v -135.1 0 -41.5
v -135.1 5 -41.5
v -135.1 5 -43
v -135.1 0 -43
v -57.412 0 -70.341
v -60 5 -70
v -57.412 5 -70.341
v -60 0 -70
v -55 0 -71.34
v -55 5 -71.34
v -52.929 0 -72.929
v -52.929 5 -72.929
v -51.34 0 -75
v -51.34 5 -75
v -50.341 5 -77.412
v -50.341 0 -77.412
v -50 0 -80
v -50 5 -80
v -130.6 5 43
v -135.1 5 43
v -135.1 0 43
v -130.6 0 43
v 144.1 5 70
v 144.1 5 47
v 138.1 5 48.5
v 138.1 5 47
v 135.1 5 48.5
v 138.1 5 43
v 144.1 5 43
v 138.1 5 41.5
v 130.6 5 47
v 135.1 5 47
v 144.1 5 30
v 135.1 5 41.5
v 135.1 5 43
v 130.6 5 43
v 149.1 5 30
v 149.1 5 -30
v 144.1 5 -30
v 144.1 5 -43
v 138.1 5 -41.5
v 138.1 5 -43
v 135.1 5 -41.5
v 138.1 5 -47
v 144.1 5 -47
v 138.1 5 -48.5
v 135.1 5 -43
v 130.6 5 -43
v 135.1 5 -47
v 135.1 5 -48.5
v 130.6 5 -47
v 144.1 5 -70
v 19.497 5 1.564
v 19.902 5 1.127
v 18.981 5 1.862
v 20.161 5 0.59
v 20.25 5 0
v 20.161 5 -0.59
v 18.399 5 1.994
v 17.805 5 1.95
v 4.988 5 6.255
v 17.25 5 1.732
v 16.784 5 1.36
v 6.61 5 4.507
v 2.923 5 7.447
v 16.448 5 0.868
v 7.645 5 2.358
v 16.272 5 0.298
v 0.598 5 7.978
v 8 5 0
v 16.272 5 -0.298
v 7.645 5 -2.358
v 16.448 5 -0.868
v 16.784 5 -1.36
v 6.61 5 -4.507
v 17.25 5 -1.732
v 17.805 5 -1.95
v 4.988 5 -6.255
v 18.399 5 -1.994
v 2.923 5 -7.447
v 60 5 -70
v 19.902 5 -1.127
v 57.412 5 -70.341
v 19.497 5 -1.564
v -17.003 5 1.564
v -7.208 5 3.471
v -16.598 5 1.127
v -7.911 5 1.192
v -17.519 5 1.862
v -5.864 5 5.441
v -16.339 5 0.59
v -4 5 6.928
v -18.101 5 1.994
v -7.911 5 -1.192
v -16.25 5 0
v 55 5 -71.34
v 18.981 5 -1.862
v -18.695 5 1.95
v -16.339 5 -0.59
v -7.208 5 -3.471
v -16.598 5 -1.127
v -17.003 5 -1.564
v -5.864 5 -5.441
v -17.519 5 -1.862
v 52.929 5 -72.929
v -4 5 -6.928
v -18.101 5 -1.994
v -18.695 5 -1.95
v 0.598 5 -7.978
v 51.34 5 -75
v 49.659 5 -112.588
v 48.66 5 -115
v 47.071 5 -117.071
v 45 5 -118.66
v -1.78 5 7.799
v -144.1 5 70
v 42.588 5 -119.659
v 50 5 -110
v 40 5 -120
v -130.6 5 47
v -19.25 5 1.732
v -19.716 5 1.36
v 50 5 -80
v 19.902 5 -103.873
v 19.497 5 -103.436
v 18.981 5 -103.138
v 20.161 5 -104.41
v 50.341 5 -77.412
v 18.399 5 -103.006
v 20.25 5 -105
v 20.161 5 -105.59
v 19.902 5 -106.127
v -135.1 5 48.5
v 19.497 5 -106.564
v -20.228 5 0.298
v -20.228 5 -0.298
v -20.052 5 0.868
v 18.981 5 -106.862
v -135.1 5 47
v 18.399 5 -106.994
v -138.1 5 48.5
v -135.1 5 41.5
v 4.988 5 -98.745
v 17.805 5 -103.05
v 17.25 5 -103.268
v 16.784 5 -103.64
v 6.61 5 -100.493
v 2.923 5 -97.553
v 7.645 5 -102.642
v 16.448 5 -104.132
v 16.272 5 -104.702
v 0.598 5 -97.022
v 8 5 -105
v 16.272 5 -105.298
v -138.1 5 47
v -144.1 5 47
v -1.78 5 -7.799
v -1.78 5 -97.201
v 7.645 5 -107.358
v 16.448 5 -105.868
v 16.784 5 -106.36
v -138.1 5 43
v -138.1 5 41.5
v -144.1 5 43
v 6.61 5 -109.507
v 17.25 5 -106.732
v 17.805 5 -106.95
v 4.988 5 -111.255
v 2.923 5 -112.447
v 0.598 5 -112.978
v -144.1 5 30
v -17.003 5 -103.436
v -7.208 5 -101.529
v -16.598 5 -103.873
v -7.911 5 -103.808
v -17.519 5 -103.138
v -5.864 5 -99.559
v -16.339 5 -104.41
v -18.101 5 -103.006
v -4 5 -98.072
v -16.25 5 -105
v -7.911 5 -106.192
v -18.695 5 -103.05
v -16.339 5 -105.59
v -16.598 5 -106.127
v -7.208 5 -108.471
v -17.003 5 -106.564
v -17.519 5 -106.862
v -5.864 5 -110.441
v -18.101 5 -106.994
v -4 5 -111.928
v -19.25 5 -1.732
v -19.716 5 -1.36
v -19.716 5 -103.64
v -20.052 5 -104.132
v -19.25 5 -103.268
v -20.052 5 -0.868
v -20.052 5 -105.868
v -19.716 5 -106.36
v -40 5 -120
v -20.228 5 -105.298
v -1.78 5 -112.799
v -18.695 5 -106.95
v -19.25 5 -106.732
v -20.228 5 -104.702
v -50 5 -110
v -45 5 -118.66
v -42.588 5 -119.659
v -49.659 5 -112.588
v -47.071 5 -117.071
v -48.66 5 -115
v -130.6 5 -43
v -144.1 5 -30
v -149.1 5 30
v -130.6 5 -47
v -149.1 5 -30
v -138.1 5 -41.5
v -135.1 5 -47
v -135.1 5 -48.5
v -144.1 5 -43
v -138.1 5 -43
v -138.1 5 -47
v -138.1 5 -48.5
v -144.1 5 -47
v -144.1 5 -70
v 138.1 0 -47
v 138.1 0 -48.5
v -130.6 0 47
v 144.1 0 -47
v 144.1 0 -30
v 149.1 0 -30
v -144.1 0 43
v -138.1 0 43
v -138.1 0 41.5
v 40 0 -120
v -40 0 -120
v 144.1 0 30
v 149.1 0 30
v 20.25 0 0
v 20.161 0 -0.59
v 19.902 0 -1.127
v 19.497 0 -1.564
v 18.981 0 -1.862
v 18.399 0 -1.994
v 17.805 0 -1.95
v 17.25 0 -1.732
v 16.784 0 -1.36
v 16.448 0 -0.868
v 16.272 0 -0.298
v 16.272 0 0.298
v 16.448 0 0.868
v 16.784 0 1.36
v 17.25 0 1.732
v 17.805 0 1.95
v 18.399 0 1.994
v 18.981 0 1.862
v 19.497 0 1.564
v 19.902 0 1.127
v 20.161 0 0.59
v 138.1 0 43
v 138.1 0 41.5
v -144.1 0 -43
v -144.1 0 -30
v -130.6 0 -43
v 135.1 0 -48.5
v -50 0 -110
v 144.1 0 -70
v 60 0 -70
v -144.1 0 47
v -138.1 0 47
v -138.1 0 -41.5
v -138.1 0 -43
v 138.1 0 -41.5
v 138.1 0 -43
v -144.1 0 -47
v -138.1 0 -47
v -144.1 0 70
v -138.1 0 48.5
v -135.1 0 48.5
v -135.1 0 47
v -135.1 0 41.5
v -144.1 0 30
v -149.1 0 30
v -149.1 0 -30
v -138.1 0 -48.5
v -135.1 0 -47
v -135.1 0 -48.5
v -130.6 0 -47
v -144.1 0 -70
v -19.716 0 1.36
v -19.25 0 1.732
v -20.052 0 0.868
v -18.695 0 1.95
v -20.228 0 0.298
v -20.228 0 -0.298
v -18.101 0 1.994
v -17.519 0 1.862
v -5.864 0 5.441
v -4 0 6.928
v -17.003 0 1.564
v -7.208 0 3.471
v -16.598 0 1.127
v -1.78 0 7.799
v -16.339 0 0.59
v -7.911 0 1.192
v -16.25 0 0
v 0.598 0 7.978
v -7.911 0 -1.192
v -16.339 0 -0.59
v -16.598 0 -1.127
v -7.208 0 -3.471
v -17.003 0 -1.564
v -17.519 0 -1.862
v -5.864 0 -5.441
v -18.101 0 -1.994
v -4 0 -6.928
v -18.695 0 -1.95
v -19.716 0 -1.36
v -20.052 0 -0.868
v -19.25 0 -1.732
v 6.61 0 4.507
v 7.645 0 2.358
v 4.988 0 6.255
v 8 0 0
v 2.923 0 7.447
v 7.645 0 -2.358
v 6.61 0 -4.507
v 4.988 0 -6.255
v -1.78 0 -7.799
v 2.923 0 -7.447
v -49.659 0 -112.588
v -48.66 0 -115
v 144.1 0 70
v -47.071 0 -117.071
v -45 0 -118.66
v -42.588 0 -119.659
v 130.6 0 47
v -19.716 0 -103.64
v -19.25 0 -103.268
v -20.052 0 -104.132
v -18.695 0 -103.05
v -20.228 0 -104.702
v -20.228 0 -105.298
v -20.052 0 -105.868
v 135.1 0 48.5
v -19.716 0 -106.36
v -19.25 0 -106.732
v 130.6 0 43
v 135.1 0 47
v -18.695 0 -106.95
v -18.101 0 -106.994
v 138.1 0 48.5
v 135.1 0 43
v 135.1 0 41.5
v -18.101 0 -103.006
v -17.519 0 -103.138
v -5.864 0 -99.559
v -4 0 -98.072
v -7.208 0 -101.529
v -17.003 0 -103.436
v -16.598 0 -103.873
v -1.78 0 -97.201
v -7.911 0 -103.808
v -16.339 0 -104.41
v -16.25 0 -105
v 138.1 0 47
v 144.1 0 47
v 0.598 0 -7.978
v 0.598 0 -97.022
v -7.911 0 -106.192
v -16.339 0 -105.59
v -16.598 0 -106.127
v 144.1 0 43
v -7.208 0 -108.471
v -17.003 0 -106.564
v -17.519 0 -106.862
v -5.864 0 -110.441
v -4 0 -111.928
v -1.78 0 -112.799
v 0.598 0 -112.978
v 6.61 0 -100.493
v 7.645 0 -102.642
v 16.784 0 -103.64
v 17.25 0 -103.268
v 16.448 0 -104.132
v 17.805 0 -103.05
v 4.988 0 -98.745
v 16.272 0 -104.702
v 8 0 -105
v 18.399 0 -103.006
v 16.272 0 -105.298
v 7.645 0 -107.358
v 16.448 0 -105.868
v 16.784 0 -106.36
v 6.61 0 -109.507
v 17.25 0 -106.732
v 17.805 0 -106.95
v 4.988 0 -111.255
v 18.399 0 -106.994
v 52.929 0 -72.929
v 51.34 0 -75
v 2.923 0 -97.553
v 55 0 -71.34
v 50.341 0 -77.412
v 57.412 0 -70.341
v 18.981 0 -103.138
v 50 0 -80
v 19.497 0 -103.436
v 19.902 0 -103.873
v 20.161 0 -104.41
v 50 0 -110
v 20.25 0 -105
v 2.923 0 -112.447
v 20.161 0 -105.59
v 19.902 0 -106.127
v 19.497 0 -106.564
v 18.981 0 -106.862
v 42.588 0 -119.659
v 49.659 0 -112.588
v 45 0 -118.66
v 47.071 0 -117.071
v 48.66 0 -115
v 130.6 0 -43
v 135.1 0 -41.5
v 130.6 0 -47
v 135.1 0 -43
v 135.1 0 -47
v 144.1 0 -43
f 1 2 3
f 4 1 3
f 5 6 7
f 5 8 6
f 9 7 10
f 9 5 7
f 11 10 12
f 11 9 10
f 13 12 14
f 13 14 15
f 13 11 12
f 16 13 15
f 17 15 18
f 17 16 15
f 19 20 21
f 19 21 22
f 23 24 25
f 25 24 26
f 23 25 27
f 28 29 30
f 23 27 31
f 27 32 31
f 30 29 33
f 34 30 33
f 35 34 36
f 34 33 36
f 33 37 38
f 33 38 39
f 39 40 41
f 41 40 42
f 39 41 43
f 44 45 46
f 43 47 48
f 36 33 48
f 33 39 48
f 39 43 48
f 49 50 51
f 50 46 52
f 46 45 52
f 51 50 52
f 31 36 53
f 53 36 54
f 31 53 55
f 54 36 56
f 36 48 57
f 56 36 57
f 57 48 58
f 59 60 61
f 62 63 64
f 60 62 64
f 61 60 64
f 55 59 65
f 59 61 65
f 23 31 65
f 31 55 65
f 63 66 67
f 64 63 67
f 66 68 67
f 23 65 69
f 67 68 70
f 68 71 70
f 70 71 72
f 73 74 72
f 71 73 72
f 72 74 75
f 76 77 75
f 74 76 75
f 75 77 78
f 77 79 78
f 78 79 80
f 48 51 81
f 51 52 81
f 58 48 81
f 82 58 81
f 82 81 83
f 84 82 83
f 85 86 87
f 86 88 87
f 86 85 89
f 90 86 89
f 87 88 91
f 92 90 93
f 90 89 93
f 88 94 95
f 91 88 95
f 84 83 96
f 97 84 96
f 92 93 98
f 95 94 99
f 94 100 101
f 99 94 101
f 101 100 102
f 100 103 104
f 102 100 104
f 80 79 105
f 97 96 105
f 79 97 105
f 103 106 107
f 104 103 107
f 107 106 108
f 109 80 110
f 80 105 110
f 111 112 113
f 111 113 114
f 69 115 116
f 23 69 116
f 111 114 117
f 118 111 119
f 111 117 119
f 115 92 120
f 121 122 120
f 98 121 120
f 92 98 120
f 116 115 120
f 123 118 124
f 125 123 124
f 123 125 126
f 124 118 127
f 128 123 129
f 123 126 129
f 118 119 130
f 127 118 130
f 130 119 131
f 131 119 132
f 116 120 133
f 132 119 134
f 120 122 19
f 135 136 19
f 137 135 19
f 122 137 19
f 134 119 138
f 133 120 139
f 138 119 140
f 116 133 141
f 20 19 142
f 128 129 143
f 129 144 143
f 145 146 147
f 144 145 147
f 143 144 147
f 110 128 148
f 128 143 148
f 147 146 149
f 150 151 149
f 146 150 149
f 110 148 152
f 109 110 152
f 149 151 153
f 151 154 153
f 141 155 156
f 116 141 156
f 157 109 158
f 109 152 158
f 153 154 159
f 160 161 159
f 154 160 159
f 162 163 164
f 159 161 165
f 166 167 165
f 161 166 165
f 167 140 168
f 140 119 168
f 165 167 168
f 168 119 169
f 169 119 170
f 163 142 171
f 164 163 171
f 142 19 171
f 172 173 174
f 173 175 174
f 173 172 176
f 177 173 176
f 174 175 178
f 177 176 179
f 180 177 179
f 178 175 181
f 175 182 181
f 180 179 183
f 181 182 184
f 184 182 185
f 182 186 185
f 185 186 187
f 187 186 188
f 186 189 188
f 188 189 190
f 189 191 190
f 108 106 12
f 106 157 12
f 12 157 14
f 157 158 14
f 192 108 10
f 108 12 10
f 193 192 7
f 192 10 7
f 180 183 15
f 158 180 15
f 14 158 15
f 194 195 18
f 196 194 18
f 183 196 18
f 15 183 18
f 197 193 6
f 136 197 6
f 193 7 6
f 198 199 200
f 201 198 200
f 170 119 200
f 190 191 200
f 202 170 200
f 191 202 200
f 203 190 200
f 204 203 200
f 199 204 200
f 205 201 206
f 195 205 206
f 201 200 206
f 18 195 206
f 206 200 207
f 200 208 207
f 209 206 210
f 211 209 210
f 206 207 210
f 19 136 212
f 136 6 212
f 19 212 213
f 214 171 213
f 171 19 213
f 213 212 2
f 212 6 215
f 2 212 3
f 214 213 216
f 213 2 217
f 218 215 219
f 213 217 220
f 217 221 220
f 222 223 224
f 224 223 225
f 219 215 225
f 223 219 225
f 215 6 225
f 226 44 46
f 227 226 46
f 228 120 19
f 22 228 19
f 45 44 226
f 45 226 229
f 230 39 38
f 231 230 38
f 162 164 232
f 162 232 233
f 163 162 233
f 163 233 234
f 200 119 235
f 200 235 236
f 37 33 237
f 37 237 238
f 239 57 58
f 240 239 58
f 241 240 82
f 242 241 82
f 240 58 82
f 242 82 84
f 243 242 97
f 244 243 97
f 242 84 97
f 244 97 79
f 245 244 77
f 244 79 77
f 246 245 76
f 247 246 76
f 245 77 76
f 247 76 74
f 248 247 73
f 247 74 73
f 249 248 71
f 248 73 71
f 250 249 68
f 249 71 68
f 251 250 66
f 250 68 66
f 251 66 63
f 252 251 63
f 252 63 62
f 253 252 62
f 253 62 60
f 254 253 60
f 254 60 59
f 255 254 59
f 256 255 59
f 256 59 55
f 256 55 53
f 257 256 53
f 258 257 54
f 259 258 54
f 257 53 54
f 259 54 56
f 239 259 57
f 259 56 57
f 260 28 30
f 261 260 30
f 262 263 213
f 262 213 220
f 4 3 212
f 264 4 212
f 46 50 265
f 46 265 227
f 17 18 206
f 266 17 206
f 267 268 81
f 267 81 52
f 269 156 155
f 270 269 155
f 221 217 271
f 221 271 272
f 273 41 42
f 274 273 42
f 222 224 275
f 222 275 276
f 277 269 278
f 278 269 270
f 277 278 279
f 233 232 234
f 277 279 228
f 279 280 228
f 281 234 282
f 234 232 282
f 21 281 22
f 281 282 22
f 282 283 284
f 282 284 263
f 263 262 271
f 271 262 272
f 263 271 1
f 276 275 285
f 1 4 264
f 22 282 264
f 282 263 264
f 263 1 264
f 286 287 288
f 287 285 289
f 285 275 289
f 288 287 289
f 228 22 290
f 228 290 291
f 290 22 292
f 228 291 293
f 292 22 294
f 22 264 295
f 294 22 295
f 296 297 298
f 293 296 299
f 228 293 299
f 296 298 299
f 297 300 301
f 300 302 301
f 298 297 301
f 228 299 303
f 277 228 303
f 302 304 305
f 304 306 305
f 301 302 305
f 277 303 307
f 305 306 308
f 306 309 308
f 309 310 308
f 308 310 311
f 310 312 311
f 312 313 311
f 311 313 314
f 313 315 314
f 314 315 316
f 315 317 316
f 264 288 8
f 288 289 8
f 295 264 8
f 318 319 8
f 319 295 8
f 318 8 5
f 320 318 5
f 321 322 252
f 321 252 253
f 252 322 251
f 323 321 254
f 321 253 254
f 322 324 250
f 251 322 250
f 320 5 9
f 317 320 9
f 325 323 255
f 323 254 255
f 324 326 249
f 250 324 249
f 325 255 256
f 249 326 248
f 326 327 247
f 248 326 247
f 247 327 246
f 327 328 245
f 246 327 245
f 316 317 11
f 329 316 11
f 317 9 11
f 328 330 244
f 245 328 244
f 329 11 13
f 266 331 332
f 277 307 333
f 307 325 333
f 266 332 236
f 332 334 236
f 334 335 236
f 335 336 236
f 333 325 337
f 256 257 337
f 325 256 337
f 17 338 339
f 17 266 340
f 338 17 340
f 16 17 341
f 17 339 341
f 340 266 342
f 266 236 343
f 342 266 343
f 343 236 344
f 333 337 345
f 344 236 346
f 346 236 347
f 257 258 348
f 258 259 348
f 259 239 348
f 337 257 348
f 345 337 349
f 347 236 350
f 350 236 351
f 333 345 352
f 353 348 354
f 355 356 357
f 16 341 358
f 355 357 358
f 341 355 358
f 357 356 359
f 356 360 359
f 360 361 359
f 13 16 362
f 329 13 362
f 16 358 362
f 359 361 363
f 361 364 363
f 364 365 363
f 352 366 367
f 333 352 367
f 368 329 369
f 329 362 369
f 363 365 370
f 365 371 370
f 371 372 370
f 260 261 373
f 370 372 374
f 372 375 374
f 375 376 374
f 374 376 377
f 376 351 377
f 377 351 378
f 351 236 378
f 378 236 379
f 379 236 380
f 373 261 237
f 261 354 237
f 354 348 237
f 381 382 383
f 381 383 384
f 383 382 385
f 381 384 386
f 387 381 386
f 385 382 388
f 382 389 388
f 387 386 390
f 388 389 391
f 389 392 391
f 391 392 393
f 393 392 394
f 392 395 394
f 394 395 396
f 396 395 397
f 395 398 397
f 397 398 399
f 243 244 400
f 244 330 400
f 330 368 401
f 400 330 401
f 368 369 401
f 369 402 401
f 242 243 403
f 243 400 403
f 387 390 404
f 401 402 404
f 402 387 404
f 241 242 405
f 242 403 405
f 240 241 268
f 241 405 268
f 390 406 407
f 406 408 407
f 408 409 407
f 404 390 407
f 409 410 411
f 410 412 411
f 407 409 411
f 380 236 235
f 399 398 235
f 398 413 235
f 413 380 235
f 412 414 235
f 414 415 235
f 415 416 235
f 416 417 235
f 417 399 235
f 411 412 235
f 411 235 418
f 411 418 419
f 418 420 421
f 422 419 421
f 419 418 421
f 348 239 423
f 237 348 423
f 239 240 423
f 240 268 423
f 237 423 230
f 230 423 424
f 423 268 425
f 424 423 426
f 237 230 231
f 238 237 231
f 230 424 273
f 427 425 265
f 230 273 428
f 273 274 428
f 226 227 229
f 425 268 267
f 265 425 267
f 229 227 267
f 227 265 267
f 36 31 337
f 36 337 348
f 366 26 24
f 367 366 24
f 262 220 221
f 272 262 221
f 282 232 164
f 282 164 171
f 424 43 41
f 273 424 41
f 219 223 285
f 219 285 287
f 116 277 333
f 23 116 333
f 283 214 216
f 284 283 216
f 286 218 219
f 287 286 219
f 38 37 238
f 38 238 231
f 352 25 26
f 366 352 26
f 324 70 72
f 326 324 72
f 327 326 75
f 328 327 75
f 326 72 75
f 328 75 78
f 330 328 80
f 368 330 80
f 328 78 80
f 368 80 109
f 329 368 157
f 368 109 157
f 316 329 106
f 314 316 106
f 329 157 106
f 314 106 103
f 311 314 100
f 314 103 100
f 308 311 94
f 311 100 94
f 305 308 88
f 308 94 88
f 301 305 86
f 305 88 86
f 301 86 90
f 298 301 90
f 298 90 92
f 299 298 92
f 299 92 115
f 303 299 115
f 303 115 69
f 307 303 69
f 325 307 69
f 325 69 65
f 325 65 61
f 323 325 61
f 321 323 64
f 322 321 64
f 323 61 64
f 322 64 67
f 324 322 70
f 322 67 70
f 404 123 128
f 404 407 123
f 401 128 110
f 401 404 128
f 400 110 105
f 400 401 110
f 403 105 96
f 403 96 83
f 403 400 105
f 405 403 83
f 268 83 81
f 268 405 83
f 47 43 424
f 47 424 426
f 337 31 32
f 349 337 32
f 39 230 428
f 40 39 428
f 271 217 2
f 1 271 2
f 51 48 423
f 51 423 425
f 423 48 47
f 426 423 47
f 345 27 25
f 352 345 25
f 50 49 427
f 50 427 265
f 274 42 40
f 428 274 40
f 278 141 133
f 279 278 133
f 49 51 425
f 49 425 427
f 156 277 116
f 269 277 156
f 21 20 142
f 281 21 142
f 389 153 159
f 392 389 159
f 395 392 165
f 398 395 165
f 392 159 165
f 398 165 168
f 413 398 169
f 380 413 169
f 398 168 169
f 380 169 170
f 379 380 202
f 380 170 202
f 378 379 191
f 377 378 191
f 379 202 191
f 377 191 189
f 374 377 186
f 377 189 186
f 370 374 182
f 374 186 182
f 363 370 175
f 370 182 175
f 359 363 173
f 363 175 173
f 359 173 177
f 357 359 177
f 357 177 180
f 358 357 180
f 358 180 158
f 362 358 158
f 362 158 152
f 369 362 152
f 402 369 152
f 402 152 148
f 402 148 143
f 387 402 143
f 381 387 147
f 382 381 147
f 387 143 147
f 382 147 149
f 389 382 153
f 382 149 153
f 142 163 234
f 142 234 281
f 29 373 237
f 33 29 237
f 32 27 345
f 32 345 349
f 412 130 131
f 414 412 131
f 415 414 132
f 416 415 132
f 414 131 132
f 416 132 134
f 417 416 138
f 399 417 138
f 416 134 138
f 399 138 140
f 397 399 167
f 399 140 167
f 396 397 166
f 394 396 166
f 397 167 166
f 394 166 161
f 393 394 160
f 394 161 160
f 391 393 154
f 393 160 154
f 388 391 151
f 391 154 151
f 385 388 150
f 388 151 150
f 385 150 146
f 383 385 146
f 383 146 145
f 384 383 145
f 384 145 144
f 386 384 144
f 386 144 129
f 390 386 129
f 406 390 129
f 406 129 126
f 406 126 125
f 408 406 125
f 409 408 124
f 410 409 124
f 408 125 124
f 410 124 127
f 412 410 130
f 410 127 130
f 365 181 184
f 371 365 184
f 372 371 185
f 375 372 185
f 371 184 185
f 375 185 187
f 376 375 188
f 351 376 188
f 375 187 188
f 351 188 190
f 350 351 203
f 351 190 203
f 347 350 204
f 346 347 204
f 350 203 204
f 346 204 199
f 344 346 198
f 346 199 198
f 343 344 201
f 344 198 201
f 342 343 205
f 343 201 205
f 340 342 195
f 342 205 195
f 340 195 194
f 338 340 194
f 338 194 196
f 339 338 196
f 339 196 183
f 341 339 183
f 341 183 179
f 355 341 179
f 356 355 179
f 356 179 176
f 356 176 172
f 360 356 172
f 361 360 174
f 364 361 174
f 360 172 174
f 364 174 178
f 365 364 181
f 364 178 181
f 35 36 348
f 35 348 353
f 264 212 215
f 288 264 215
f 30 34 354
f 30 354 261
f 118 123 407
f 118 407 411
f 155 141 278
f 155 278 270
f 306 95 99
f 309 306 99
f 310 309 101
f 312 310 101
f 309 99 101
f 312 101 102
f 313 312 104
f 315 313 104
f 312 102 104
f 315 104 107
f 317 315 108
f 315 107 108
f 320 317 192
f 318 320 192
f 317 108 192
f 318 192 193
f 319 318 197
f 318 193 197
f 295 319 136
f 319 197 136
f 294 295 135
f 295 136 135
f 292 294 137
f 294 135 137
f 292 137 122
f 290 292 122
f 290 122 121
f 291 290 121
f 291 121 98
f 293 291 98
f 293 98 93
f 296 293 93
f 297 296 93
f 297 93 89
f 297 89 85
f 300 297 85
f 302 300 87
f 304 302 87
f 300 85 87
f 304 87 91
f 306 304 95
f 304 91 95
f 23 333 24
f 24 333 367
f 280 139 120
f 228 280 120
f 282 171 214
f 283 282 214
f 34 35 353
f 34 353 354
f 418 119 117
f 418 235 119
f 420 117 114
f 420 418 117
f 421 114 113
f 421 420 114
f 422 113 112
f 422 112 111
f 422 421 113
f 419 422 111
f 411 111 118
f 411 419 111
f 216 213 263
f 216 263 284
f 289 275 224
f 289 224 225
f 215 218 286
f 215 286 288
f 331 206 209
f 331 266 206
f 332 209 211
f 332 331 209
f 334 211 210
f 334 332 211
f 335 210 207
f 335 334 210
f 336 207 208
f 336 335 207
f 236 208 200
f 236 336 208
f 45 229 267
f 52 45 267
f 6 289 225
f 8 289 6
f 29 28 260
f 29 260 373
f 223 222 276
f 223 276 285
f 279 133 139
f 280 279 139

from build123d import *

# Parameters (mm, degrees)
SKETCH1_W           = 288.2
SKETCH1_H           = 140
EXTRUDE_5_DEPTH     = 5
SKETCH2_W           = 10
SKETCH2_H           = 60
BOSS_EXTRUDE2_DEPTH = 5
SKETCH3_W           = 27
SKETCH3_H           = 4
SKETCH3_W_2         = 3
SKETCH3_H_2         = 7
CUT_EXTRUDE1_DEPTH  = 5
SKETCH4_R           = 8
CUT_EXTRUDE2_DEPTH  = 5
SKETCH5_R           = 2
CUT_EXTRUDE3_DEPTH  = 5
SKETCH6_W           = 50
SKETCH6_H           = 50
BOSS_EXTRUDE3_DEPTH = 5
LPATTERN1_COUNT     = 2
LPATTERN1_PITCH     = 105
FILLET1_R           = 10
FILLET2_R           = 10


with BuildPart() as part:
    # Sketch1 → Extrude 5 (new body)
    with BuildSketch(Plane(origin=(0, 0, 0), x_dir=(1, 0, 0), z_dir=(0, 1, 0))):
        Rectangle(SKETCH1_W, SKETCH1_H)
    extrude(amount=EXTRUDE_5_DEPTH)

    # Sketch2 → Boss-Extrude2 (add)
    with BuildSketch(Plane(origin=(0, 5, 0), x_dir=(1, 0, 0), z_dir=(0, 1, 0))):
        with Locations((144.1, 0)):
            Rectangle(SKETCH2_W, SKETCH2_H)
    boss_extrude2 = extrude(amount=-BOSS_EXTRUDE2_DEPTH)

    # Mirror1: Boss-Extrude2 across plane
    add(boss_extrude2.mirror(Plane(origin=(0, 0, 0), x_dir=(0, 0, 1), z_dir=(1, 0, 0))))

    # Sketch3 → Cut-Extrude1 (cut)
    with BuildSketch(Plane(origin=(0, 5, 0), x_dir=(1, 0, 0), z_dir=(0, 1, 0))):
        with Locations((144.1, 45)):
            Rectangle(SKETCH3_W, SKETCH3_H)
        with Locations((136.6, 45)):
            Rectangle(SKETCH3_W_2, SKETCH3_H_2)
        with Locations((136.6, -45)):
            Rectangle(SKETCH3_W_2, SKETCH3_H_2)
        with Locations((144.1, -45)):
            Rectangle(SKETCH3_W, SKETCH3_H)
        with Locations((-144.1, -45)):
            Rectangle(SKETCH3_W, SKETCH3_H)
        with Locations((-136.6, -45)):
            Rectangle(SKETCH3_W_2, SKETCH3_H_2)
        with Locations((-136.6, 45)):
            Rectangle(SKETCH3_W_2, SKETCH3_H_2)
        with Locations((-144.1, 45)):
            Rectangle(SKETCH3_W, SKETCH3_H)
    extrude(amount=-CUT_EXTRUDE1_DEPTH, mode=Mode.SUBTRACT)

    # Sketch4 → Cut-Extrude2 (cut)
    with BuildSketch(Plane(origin=(0, 5, 0), x_dir=(1, 0, 0), z_dir=(0, 1, 0))):
        Circle(SKETCH4_R)
    cut_extrude2 = extrude(amount=-CUT_EXTRUDE2_DEPTH, mode=Mode.SUBTRACT)

    # Sketch5 → Cut-Extrude3 (cut)
    with BuildSketch(Plane(origin=(0, 5, 0), x_dir=(1, 0, 0), z_dir=(0, 1, 0))):
        with Locations((-18.25, 0)):
            Circle(SKETCH5_R)
        with Locations((18.25, 0)):
            Circle(SKETCH5_R)
    cut_extrude3 = extrude(amount=-CUT_EXTRUDE3_DEPTH, mode=Mode.SUBTRACT)

    # Sketch6 → Boss-Extrude3 (add)
    with BuildSketch(Plane(origin=(0, 5, 0), x_dir=(1, 0, 0), z_dir=(0, 1, 0))):
        with Locations((-25, 95)):
            Rectangle(SKETCH6_W, SKETCH6_H)
        with Locations((25, 95)):
            Rectangle(SKETCH6_W, SKETCH6_H)
    extrude(amount=-BOSS_EXTRUDE3_DEPTH)

    # LPattern1: Cut-Extrude2, Cut-Extrude3 ×2
    with Locations(*[(0, 0, -i * LPATTERN1_PITCH) for i in range(1, LPATTERN1_COUNT)]):
        add(cut_extrude2, mode=Mode.SUBTRACT)
        add(cut_extrude3, mode=Mode.SUBTRACT)

    # Fillet1
    fillet1_edges = [part.edges().sort_by_distance(p)[0] for p in [
        (-50, 2.5, -70),
        (50, 2.5, -70),
    ]]
    fillet(fillet1_edges, radius=FILLET1_R)

    # Fillet2
    fillet2_edges = [part.edges().sort_by_distance(p)[0] for p in [
        (-50, 2.5, -120),
        (50, 2.5, -120),
    ]]
    fillet(fillet2_edges, radius=FILLET2_R)


solid = part.part
